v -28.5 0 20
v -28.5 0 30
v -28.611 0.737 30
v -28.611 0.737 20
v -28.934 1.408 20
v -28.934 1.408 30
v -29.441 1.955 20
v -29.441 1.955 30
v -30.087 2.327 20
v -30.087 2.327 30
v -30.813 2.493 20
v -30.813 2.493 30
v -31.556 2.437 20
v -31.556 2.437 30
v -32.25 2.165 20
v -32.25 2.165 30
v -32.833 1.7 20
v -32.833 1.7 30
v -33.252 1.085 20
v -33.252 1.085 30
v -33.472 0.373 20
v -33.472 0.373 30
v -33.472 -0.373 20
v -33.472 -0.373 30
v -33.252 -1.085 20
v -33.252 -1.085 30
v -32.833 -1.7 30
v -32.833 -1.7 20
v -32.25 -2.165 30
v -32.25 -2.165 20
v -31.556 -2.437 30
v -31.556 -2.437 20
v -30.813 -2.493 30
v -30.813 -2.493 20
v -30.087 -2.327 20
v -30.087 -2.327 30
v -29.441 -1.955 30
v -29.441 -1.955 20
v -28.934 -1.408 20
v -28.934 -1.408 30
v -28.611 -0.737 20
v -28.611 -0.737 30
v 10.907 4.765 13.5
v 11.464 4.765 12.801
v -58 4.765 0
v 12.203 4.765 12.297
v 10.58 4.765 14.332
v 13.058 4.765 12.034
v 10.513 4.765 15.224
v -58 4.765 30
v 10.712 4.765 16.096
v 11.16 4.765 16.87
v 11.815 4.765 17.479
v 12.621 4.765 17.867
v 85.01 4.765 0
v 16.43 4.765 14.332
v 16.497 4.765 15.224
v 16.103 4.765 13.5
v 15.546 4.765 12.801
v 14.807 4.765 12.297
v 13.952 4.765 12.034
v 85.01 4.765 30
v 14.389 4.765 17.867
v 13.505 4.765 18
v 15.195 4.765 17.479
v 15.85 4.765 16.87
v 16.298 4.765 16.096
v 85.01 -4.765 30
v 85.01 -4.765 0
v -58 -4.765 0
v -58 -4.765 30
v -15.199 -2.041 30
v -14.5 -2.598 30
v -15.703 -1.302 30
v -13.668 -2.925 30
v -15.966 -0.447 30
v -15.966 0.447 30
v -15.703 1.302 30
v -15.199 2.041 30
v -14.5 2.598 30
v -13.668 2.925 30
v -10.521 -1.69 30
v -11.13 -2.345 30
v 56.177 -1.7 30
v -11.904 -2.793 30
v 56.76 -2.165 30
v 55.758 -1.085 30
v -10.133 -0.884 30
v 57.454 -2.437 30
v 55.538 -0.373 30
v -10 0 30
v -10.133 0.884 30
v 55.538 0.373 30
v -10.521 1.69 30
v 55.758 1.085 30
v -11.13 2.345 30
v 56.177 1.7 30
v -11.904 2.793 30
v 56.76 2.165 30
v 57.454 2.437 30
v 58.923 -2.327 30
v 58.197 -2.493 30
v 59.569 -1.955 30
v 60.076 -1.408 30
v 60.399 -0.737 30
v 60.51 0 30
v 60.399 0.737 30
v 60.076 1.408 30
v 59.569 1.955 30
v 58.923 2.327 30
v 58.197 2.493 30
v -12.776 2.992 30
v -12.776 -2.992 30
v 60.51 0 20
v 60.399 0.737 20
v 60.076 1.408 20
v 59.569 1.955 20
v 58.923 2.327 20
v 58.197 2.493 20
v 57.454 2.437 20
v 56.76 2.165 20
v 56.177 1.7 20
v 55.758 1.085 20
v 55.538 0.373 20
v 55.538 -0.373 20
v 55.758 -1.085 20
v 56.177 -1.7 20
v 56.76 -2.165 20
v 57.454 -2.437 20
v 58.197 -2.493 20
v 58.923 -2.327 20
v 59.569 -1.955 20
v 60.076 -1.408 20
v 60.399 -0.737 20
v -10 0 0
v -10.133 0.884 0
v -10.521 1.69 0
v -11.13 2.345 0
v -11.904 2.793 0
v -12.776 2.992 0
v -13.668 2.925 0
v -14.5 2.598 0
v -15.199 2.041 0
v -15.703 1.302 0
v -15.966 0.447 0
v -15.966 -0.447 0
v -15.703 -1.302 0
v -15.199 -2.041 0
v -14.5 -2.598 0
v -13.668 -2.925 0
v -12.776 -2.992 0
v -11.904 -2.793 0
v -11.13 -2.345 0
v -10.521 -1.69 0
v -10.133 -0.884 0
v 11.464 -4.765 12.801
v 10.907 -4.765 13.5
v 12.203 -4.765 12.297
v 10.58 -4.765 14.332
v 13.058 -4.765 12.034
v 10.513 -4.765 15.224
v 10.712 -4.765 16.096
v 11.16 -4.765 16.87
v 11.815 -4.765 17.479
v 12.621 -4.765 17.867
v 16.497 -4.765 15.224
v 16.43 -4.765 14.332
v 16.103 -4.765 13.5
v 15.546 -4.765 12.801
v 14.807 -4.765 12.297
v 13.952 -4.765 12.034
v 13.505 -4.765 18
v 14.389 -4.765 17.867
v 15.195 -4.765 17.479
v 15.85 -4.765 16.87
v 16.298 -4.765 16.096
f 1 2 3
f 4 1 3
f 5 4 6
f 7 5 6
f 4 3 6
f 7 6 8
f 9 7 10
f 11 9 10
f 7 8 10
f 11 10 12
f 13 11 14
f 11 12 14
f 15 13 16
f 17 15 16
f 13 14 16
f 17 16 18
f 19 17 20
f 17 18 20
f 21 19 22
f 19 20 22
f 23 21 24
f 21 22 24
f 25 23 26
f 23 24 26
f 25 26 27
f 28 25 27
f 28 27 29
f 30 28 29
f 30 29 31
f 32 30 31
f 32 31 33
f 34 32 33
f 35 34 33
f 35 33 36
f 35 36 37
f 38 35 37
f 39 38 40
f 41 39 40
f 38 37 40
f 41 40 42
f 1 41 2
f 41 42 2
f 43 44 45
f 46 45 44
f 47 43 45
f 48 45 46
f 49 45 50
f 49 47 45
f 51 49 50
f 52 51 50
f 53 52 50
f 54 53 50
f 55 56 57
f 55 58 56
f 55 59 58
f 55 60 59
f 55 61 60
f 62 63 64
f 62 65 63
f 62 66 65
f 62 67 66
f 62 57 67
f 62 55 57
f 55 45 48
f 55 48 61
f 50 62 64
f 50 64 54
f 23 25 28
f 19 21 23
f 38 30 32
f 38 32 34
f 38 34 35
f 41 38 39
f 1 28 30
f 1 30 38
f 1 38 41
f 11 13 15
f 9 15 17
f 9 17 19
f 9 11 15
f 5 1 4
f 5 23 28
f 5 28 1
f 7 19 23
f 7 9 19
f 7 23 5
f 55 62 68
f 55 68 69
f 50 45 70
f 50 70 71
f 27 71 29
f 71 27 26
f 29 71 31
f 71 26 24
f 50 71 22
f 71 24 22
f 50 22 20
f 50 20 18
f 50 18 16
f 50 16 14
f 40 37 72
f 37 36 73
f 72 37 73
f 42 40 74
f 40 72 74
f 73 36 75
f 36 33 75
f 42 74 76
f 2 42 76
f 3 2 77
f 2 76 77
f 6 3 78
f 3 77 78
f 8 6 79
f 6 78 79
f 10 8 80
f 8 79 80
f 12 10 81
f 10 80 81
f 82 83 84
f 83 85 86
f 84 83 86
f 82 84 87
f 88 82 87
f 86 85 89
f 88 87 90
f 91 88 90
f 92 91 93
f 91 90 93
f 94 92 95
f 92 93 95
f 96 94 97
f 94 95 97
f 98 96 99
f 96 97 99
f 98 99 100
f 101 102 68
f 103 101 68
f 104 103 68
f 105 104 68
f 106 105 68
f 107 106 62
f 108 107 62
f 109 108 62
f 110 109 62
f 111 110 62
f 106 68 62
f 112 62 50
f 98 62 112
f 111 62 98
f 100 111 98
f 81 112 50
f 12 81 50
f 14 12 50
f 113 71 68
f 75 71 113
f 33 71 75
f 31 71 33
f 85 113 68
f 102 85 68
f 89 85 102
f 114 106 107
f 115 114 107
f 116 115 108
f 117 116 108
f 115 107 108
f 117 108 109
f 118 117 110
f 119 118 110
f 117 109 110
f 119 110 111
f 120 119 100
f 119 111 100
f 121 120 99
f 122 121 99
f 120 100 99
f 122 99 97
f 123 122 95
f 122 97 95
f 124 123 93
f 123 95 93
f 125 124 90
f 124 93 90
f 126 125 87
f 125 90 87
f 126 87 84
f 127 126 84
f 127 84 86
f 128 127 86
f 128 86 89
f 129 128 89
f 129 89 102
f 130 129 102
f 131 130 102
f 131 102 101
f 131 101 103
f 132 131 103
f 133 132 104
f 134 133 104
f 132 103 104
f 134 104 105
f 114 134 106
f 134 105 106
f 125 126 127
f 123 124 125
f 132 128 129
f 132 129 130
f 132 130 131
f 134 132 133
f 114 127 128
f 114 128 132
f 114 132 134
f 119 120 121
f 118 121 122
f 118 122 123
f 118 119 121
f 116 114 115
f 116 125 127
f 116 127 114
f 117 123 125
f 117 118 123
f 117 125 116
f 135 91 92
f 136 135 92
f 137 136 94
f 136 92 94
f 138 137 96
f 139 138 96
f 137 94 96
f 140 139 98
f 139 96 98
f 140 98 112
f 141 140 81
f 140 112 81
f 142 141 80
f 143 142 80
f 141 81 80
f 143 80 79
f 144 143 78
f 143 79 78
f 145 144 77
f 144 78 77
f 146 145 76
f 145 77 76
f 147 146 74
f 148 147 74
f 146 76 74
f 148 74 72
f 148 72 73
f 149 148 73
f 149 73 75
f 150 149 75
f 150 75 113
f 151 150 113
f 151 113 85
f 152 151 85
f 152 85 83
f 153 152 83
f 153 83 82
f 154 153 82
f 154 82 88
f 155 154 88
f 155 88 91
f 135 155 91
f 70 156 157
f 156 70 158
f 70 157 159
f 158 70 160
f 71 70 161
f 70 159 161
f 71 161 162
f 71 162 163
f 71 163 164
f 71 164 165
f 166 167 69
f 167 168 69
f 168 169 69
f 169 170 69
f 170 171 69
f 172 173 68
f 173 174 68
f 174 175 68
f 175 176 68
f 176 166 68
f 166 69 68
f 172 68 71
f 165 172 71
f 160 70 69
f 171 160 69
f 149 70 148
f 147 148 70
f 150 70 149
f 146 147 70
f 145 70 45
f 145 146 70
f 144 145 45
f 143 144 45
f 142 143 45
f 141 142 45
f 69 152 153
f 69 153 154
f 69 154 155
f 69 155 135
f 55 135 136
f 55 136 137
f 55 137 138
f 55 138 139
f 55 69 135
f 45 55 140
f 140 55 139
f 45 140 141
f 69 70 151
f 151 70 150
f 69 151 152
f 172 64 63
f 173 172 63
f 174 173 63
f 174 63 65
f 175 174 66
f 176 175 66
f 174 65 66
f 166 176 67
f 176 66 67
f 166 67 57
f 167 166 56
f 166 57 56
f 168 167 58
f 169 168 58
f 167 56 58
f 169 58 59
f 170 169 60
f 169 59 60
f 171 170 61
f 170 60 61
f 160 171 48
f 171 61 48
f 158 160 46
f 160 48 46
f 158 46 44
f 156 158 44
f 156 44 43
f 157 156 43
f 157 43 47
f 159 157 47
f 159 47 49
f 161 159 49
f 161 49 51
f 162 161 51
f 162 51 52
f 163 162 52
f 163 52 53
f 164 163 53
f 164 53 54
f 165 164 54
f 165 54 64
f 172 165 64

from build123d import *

# Parameters (mm, degrees)
ESBO_O1_W                = 50
ESBO_O1_H                = 9.53
RESSALTO_EXTRUS_O1_DEPTH = 30
ESBO_O2_R                = 3
CORTE_EXTRUS_O1_DEPTH    = 40.340884904
ESBO_O4_W                = 30
ESBO_O4_H                = 9.53
RESSALTO_EXTRUS_O3_DEPTH = 60.01
ESBO_O5_W                = 30
ESBO_O5_H                = 9.53
RESSALTO_EXTRUS_O4_DEPTH = 33
ESBO_O6_R                = 2.5
CORTE_EXTRUS_O2_DEPTH    = 10
CORTE_EXTRUS_O3_REACH    = 92.651
ESBO_O7_R                = 3


with BuildPart() as part:
    # Esboço1 → Ressalto-extrusão1 (new body)
    with BuildSketch(Plane.XY):
        Rectangle(ESBO_O1_W, ESBO_O1_H)
    extrude(amount=RESSALTO_EXTRUS_O1_DEPTH)

    # Esboço2 → Corte-extrusão1 (cut, through all)
    with BuildSketch(Plane.XY.offset(30)):
        with Locations((-13, 0)):
            Circle(ESBO_O2_R)
    extrude(amount=-CORTE_EXTRUS_O1_DEPTH, mode=Mode.SUBTRACT)

    # Esboço4 → Ressalto-extrusão3 (add)
    with BuildSketch(Plane(origin=(25, 0, 0), x_dir=(0, 0, -1), z_dir=(1, 0, 0))):
        with Locations((-15, 0)):
            Rectangle(ESBO_O4_W, ESBO_O4_H)
    extrude(amount=RESSALTO_EXTRUS_O3_DEPTH)

    # Esboço5 → Ressalto-extrusão4 (add)
    with BuildSketch(Plane.ZY.offset(25)):
        with Locations((15, 0)):
            Rectangle(ESBO_O5_W, ESBO_O5_H)
    extrude(amount=RESSALTO_EXTRUS_O4_DEPTH)

    # Esboço6 → Corte-extrusão2 (cut)
    with BuildSketch(Plane.XY.offset(30)):
        with Locations((-31, 0)):
            Circle(ESBO_O6_R)
        with Locations((58.01, 0)):
            Circle(ESBO_O6_R)
    extrude(amount=-CORTE_EXTRUS_O2_DEPTH, mode=Mode.SUBTRACT)

    # Esboço7 → Corte-extrusão3 (cut, up to next)
    with BuildSketch(Plane(origin=(0, 4.765, 0), x_dir=(1, 0, 0), z_dir=(0, 1, 0)), mode=Mode.PRIVATE) as corte_extrus_o3_sk1:
        with Locations(Location((13.505, -15, 0), (0, 0, 270))):
            Circle(ESBO_O7_R)
    corte_extrus_o3_tool1 = extrude(corte_extrus_o3_sk1.sketch, amount=-CORTE_EXTRUS_O3_REACH, mode=Mode.PRIVATE) & part.part
    add(corte_extrus_o3_tool1.solids().sort_by_distance((13.505, 4.765, 15))[0], mode=Mode.SUBTRACT)


solid = part.part
